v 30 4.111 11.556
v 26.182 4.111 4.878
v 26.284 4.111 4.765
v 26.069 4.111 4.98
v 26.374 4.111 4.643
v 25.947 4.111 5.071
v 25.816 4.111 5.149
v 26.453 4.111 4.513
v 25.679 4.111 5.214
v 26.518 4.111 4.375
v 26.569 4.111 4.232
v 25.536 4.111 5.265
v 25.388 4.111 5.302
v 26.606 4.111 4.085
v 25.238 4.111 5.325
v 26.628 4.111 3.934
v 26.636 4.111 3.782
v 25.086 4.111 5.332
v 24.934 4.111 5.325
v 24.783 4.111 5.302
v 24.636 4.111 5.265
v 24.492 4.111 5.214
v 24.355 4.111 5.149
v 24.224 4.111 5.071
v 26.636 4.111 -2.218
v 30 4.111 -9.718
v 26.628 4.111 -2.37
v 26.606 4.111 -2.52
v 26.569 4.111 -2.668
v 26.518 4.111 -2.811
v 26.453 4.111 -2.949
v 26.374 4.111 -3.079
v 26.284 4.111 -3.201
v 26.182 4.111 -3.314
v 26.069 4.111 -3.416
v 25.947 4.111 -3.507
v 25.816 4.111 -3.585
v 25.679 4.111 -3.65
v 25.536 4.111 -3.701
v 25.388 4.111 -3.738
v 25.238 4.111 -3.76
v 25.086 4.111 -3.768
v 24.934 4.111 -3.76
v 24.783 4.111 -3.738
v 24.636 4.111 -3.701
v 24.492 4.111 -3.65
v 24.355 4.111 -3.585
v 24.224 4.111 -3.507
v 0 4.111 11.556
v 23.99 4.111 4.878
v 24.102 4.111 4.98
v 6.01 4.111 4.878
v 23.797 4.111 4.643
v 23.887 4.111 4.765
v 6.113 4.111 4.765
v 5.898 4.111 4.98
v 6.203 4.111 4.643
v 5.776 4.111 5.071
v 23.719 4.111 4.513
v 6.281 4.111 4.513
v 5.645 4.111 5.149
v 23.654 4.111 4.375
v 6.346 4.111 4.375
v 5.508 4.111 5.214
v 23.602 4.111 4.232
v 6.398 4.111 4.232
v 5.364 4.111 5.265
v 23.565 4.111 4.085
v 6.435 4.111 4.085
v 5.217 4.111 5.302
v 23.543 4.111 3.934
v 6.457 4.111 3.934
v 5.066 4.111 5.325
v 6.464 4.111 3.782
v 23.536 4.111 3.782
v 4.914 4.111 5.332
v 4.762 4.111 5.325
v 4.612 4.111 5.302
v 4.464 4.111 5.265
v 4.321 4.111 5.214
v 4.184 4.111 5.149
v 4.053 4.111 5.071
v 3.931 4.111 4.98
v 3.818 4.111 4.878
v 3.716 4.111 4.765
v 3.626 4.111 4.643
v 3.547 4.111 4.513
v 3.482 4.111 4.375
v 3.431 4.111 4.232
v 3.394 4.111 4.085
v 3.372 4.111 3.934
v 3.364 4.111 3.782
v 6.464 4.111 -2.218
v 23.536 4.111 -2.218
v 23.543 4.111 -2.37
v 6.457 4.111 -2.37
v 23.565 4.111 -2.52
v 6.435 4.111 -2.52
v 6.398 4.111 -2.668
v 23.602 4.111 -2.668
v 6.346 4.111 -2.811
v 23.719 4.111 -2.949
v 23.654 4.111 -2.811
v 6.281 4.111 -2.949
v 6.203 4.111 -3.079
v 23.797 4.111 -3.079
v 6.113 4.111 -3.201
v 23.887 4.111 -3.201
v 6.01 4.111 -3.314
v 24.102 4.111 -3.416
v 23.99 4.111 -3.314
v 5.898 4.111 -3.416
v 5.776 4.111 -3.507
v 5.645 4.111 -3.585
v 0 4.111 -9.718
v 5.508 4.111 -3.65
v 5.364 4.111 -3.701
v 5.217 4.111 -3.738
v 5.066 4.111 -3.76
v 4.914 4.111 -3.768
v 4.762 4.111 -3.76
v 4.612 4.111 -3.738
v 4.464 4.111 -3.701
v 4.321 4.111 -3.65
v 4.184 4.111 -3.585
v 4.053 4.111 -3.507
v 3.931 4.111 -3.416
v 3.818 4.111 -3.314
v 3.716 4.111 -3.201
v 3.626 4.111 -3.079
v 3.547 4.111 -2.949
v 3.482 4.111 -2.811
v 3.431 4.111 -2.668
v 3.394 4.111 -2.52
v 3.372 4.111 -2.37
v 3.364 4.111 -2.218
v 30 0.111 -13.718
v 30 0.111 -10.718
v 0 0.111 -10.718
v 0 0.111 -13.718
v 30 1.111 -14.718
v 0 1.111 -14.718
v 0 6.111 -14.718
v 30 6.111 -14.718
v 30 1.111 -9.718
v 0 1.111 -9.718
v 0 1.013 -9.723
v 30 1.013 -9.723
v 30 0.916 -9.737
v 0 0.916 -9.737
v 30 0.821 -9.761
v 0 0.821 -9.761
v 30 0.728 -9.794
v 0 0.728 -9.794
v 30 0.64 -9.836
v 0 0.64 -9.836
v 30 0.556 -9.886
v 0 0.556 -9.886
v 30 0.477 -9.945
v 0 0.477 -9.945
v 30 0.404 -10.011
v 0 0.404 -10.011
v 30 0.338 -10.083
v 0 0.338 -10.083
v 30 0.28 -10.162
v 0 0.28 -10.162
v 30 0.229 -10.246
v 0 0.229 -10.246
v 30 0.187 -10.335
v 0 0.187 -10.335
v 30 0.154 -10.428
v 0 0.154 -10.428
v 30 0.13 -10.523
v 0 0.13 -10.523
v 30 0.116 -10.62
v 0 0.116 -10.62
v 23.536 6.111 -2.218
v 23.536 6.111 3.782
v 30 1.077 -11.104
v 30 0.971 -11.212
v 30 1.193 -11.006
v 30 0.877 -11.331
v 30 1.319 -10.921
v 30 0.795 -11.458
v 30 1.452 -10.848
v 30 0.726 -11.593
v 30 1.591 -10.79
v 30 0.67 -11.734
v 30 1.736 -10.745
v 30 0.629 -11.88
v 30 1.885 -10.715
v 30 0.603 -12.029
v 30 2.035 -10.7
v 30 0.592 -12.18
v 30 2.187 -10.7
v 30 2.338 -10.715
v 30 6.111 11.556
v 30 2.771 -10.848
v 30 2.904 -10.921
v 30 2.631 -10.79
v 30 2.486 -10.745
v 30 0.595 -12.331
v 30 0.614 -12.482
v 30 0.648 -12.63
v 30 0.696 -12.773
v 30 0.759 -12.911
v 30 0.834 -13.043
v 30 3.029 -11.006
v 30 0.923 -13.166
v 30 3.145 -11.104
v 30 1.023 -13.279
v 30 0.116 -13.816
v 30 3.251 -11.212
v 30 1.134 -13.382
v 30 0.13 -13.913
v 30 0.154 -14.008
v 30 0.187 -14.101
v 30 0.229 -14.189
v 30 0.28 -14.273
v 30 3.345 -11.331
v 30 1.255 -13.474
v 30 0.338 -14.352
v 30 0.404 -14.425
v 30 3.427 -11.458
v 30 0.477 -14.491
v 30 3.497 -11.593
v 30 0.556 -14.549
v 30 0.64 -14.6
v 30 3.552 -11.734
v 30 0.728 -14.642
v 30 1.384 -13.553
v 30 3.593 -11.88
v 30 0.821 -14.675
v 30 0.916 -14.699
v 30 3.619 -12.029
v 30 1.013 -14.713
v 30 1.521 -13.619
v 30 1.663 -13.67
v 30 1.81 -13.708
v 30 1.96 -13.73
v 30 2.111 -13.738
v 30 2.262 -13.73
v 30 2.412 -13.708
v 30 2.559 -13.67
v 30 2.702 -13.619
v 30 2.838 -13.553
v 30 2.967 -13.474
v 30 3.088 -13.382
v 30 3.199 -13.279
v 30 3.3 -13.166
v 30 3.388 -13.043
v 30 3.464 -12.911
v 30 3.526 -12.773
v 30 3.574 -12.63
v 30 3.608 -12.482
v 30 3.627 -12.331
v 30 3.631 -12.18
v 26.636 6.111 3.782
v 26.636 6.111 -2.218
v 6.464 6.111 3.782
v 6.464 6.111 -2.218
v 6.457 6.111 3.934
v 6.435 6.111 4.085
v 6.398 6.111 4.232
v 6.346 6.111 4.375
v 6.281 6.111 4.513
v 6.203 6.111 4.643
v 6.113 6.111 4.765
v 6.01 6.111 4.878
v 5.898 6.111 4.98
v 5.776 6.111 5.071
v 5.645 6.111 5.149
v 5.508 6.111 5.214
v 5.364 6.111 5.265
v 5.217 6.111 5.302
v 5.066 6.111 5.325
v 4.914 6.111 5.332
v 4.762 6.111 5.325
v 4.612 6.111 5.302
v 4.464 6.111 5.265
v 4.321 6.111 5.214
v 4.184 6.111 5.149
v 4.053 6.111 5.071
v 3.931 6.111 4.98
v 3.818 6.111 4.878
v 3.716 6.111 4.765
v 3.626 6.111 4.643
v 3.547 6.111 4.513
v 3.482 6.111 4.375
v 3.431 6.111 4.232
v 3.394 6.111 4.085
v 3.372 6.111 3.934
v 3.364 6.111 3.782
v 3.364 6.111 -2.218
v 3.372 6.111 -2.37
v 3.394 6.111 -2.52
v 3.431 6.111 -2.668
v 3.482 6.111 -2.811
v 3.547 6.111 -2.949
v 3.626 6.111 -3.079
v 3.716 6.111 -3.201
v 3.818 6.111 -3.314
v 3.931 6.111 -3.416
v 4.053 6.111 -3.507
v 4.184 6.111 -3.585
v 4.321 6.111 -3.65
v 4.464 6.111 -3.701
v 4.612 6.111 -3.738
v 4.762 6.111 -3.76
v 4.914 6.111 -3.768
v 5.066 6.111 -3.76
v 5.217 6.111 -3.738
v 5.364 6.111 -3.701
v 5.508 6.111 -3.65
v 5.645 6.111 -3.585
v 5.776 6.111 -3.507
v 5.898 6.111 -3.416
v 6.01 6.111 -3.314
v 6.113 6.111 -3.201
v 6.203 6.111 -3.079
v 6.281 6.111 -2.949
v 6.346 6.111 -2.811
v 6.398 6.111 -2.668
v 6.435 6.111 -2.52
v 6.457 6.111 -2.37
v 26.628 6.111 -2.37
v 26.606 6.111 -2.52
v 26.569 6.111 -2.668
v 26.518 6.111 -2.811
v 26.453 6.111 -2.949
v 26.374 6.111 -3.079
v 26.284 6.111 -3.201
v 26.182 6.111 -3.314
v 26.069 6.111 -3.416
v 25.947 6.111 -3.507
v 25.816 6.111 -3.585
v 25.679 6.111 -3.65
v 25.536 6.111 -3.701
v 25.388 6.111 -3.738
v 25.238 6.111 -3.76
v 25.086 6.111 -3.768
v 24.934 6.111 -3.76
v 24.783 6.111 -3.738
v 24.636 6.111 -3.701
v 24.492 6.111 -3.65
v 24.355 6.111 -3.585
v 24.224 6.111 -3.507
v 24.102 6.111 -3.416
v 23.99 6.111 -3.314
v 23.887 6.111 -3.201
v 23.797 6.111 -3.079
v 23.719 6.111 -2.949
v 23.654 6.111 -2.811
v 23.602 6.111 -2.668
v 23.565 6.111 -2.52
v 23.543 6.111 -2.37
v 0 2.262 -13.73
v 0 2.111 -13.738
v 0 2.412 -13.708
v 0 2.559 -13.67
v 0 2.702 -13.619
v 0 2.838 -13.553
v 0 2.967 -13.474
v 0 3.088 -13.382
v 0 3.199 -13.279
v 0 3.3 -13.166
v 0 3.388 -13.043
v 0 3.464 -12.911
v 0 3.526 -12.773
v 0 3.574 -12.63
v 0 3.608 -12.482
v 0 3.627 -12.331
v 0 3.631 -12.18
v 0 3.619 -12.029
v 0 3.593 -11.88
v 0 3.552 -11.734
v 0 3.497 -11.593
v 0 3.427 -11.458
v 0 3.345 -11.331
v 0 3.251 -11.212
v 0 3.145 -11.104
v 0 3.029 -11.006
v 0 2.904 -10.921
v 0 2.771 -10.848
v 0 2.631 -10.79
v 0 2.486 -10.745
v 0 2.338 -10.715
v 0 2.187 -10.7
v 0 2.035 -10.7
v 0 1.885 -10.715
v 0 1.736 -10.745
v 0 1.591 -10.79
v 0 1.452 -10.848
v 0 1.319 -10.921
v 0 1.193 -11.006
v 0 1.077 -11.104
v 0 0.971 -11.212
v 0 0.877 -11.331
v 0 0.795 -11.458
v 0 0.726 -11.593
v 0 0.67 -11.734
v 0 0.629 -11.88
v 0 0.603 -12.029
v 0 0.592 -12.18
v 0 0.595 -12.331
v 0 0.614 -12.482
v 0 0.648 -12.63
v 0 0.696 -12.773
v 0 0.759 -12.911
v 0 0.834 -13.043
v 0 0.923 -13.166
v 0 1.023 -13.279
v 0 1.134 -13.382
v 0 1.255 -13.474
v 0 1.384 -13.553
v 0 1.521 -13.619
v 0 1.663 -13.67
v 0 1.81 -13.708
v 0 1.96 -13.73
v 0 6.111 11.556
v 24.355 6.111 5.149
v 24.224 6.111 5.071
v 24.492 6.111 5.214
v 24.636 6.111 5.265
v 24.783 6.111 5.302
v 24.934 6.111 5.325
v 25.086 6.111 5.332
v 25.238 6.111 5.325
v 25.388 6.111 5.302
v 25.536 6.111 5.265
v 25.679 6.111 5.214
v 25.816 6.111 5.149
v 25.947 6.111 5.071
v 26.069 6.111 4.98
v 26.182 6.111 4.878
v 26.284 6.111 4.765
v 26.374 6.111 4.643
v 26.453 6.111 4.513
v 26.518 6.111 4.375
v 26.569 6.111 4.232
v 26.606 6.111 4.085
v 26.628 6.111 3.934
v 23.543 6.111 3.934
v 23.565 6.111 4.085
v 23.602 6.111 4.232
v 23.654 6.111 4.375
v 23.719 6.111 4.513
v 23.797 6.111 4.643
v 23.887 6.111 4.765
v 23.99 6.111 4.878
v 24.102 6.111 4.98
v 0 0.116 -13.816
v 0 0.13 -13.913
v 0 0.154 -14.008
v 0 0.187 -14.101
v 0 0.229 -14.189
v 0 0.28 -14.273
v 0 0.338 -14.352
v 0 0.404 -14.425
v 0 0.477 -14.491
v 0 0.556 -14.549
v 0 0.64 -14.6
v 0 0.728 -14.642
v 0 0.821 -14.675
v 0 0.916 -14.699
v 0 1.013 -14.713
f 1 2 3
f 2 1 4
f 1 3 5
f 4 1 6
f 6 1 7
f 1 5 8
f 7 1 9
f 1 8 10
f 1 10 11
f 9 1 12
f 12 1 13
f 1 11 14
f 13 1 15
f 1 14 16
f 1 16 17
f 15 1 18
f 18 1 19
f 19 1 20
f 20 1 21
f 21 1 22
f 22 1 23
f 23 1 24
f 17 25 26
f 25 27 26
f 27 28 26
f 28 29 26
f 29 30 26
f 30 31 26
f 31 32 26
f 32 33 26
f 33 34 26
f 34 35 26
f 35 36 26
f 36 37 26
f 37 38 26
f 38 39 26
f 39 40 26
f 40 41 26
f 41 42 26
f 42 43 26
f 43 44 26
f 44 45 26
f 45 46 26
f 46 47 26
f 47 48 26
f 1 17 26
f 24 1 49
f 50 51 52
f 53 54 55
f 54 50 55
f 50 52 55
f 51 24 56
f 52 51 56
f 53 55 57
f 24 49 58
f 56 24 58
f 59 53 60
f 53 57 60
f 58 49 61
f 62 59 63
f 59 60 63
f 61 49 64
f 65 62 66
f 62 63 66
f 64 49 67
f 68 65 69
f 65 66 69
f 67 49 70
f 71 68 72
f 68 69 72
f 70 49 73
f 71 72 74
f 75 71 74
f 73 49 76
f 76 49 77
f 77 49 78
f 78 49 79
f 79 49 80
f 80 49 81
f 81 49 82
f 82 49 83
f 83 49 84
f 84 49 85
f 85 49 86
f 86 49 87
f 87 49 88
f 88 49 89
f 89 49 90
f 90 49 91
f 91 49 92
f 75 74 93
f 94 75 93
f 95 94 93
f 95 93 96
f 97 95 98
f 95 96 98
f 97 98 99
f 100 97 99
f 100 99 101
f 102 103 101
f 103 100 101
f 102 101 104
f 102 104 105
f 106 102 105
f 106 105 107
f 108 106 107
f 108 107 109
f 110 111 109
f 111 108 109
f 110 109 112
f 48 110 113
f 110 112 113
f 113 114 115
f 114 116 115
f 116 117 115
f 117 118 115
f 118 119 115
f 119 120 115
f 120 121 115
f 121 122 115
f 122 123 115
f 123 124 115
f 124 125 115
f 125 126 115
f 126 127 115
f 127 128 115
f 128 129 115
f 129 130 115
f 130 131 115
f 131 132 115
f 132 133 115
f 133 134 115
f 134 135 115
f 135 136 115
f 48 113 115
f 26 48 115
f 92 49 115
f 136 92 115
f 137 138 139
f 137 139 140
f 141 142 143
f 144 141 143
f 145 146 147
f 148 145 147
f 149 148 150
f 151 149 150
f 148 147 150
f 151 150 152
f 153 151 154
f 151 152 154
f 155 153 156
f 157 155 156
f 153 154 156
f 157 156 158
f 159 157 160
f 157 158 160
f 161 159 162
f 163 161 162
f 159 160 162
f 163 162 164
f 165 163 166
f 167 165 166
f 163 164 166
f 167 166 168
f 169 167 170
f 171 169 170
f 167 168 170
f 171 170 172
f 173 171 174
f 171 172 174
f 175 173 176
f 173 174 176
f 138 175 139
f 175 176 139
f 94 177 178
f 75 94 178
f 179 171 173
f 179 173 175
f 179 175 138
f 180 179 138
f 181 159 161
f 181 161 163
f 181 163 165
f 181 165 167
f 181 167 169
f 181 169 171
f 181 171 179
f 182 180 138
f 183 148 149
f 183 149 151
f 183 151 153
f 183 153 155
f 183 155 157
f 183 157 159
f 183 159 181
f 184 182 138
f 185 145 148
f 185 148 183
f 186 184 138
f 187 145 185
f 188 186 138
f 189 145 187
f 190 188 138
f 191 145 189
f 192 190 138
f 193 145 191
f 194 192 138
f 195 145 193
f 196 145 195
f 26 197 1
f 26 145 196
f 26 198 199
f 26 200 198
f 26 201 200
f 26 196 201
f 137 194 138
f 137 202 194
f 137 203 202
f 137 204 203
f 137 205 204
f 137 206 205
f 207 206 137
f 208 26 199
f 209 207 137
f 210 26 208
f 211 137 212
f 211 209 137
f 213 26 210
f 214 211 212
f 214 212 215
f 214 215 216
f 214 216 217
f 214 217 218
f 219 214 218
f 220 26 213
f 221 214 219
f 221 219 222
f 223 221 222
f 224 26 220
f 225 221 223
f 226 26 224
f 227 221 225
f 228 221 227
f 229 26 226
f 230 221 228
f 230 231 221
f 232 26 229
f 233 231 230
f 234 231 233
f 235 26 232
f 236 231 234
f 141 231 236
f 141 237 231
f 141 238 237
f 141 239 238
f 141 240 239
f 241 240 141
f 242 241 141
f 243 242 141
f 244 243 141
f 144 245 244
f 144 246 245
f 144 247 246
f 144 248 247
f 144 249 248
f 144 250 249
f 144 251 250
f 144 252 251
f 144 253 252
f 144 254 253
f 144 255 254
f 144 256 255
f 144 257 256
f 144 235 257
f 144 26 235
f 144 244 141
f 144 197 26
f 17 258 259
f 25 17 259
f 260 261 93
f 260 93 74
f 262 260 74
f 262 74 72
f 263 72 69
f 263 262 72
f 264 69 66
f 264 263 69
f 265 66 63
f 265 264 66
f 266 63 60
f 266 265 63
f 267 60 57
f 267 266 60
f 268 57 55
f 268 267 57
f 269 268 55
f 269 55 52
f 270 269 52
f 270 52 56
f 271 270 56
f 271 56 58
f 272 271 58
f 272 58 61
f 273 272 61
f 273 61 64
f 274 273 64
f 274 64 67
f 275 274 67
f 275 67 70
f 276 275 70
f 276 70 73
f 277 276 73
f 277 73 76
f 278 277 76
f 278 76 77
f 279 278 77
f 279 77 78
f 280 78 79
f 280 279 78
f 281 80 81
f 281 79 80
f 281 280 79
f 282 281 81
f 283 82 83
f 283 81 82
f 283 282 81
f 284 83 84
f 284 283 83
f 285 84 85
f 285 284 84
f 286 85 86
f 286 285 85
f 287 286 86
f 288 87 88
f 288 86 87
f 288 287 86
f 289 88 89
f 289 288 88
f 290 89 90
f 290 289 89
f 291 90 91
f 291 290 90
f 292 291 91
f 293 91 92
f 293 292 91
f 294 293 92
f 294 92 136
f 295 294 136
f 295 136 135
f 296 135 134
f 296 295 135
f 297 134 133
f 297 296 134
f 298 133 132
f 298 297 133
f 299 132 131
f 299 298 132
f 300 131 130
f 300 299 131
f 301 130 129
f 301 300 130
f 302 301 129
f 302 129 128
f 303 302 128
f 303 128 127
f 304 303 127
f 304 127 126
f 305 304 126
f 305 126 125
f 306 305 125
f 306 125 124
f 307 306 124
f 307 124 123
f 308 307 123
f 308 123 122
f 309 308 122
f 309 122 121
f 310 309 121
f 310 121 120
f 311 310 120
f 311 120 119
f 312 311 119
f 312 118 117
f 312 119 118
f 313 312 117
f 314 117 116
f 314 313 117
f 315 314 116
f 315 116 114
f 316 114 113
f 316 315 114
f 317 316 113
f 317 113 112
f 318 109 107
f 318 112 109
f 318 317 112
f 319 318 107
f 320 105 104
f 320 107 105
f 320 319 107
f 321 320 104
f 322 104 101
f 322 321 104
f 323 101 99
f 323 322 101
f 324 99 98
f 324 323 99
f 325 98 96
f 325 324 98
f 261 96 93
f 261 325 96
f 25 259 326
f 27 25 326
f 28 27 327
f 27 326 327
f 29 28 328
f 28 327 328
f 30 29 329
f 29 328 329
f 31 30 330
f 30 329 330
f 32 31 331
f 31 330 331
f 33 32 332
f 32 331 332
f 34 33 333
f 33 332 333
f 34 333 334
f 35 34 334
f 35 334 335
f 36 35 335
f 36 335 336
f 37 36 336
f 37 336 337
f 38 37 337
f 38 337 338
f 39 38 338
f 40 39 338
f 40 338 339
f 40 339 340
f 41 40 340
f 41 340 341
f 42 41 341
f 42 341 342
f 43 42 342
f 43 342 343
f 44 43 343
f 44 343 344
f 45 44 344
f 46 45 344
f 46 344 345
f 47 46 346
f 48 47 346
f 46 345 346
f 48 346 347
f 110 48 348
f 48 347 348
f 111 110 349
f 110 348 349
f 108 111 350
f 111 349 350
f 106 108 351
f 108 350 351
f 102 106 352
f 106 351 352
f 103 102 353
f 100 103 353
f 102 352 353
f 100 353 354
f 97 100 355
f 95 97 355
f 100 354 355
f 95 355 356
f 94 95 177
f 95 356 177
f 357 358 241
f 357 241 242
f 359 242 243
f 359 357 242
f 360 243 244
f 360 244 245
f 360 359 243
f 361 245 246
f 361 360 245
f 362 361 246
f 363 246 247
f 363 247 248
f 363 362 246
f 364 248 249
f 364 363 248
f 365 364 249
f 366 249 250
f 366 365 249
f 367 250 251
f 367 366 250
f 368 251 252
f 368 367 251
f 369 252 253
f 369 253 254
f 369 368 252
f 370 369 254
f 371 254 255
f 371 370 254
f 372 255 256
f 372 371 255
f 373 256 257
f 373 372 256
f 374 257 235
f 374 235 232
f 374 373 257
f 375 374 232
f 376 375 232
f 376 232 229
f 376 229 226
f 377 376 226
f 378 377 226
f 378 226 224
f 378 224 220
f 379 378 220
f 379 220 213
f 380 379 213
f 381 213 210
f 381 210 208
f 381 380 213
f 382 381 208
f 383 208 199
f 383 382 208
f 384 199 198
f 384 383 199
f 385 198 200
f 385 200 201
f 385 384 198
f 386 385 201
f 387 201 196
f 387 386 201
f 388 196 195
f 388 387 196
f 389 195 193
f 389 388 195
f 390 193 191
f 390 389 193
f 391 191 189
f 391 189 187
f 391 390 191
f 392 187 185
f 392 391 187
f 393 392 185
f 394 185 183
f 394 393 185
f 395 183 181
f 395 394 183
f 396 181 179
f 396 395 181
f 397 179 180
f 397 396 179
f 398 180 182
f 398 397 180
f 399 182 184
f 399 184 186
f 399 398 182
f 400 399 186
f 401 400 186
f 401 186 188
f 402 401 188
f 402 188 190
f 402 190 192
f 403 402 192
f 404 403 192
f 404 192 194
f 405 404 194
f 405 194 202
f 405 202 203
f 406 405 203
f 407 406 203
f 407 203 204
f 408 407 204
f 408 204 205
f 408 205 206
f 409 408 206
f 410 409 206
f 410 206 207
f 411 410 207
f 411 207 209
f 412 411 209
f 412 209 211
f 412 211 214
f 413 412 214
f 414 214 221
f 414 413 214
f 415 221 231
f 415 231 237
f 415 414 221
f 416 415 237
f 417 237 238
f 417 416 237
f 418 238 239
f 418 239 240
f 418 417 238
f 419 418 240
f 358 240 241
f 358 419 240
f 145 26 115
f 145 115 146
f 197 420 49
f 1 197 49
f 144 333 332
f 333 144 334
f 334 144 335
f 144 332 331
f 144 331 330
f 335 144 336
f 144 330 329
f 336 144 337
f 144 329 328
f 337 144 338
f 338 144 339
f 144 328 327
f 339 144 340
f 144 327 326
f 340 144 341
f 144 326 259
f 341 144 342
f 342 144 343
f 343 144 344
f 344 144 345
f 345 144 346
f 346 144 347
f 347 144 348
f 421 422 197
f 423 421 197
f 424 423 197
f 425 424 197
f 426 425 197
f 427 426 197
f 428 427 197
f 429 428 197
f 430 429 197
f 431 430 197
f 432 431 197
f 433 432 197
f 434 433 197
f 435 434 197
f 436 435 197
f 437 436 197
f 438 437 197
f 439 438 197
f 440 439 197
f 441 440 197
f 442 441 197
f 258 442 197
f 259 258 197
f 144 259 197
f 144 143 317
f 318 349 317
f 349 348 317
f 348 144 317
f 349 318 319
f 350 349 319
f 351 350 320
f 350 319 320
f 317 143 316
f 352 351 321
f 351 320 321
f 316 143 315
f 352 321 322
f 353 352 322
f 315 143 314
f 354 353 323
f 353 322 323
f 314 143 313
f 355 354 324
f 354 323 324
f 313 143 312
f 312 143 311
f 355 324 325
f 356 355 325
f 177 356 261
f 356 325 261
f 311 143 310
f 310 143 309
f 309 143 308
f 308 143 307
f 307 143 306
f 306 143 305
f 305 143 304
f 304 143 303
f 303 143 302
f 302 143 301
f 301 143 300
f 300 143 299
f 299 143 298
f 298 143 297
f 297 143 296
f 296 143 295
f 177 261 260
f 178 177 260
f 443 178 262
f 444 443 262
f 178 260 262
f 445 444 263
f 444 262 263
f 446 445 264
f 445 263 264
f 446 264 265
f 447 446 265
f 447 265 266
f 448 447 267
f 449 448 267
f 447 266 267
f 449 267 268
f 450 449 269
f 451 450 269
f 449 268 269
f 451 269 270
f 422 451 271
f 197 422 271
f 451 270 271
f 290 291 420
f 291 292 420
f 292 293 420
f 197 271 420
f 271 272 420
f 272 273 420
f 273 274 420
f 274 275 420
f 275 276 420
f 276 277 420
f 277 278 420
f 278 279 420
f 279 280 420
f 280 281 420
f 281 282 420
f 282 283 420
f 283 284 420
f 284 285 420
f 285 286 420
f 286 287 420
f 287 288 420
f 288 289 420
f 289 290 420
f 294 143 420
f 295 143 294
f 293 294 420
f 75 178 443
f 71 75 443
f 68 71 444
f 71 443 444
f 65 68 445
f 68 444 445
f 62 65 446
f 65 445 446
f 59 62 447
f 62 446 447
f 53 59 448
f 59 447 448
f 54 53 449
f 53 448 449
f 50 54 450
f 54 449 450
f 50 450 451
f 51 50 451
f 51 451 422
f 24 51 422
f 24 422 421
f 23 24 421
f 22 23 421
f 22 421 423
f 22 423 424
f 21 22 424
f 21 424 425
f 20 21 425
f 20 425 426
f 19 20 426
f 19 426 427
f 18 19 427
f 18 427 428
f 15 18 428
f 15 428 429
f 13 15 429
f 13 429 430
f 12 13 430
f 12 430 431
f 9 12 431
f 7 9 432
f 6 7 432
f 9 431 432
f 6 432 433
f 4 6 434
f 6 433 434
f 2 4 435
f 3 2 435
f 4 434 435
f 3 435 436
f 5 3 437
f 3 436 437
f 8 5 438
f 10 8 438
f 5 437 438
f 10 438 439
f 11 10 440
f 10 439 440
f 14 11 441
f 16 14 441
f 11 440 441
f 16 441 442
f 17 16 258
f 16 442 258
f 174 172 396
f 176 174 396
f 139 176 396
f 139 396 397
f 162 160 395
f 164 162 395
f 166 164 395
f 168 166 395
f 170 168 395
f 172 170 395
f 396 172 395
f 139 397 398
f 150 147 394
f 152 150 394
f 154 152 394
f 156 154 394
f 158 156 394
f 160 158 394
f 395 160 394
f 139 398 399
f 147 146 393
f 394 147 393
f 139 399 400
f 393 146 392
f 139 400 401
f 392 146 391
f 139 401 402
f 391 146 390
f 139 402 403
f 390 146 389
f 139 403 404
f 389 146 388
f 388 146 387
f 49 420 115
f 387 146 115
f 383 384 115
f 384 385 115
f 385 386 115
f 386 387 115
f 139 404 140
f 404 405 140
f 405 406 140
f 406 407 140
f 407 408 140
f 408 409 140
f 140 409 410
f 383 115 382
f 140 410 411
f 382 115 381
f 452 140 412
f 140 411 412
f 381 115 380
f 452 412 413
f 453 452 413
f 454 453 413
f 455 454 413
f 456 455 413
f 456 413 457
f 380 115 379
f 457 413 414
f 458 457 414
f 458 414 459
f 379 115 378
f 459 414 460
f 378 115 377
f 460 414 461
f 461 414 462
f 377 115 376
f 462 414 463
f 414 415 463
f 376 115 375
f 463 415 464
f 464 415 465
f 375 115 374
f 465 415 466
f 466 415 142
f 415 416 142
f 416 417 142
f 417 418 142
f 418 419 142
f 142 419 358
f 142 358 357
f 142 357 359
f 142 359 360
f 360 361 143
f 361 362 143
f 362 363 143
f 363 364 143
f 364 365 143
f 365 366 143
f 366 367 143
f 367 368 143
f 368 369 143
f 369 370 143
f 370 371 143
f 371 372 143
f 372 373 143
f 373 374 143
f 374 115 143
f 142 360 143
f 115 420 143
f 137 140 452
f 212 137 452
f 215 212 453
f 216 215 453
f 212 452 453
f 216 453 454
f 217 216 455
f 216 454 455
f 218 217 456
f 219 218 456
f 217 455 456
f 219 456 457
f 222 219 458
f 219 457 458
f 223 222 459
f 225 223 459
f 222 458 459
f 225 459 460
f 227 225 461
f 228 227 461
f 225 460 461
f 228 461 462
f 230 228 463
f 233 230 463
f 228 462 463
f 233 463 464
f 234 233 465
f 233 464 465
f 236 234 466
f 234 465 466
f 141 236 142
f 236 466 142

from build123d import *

# Parameters (mm, degrees)
SKIZZE5_R                       = 1.52
AUFSATZ_LINEAR_AUSTRAGEN3_DEPTH = 30
SCHNITT_LINEAR_AUSTRAGEN1_DEPTH = 10


with BuildPart() as part:
    # Skizze5 → Aufsatz-Linear austragen3 (new body)
    with BuildSketch(Plane(origin=(0, 0, 0), x_dir=(0, 0, -1), z_dir=(1, 0, 0))):
        with BuildLine():
            Line((-11.555611309, 6.111130946), (-11.555611309, 4.111130946))
            Line((-11.555611309, 4.111130946), (9.717875997, 4.111130946))
            Line((9.717875997, 4.111130946), (9.717875997, 1.111130946))
            ThreePointArc((9.717875997, 1.111130946), (10.010769216, 0.404024165), (10.717875997, 0.111130946))
            Line((10.717875997, 0.111130946), (13.717875997, 0.111130946))
            ThreePointArc((13.717875997, 0.111130946), (14.424982778, 0.404024165), (14.717875997, 1.111130946))
            Line((14.717875997, 1.111130946), (14.717875997, 6.111130946))
            Line((14.717875997, 6.111130946), (14.217875997, 6.111130946))
            Line((14.217875997, 6.111130946), (-11.555611309, 6.111130946))
        make_face()
        with Locations((12.217875997, 2.111130946)):
            Circle(SKIZZE5_R, mode=Mode.SUBTRACT)
    extrude(amount=AUFSATZ_LINEAR_AUSTRAGEN3_DEPTH)

    # Skizze6 → Schnitt-Linear austragen1 (cut)
    with BuildSketch(Plane(origin=(0, 6.111130946, 0), x_dir=(1, 0, 0), z_dir=(0, 1, 0))):
        with BuildLine():
            Line((3.364391914, -3.782124003), (3.364391914, 2.217875997))
            ThreePointArc((3.364391914, 2.217875997), (4.914391914, 3.767875997), (6.464391914, 2.217875997))
            Line((6.464391914, 2.217875997), (6.464391914, -3.782124003))
            ThreePointArc((6.464391914, -3.782124003), (4.914391914, -5.332124003), (3.364391914, -3.782124003))
        make_face()
        with BuildLine():
            Line((26.635608086, -3.782124003), (26.635608086, 2.217875997))
            ThreePointArc((26.635608086, 2.217875997), (25.085608086, 3.767875997), (23.535608086, 2.217875997))
            Line((23.535608086, 2.217875997), (23.535608086, -3.782124003))
            ThreePointArc((23.535608086, -3.782124003), (25.085608086, -5.332124003), (26.635608086, -3.782124003))
        make_face()
    extrude(amount=-SCHNITT_LINEAR_AUSTRAGEN1_DEPTH, mode=Mode.SUBTRACT)


solid = part.part
